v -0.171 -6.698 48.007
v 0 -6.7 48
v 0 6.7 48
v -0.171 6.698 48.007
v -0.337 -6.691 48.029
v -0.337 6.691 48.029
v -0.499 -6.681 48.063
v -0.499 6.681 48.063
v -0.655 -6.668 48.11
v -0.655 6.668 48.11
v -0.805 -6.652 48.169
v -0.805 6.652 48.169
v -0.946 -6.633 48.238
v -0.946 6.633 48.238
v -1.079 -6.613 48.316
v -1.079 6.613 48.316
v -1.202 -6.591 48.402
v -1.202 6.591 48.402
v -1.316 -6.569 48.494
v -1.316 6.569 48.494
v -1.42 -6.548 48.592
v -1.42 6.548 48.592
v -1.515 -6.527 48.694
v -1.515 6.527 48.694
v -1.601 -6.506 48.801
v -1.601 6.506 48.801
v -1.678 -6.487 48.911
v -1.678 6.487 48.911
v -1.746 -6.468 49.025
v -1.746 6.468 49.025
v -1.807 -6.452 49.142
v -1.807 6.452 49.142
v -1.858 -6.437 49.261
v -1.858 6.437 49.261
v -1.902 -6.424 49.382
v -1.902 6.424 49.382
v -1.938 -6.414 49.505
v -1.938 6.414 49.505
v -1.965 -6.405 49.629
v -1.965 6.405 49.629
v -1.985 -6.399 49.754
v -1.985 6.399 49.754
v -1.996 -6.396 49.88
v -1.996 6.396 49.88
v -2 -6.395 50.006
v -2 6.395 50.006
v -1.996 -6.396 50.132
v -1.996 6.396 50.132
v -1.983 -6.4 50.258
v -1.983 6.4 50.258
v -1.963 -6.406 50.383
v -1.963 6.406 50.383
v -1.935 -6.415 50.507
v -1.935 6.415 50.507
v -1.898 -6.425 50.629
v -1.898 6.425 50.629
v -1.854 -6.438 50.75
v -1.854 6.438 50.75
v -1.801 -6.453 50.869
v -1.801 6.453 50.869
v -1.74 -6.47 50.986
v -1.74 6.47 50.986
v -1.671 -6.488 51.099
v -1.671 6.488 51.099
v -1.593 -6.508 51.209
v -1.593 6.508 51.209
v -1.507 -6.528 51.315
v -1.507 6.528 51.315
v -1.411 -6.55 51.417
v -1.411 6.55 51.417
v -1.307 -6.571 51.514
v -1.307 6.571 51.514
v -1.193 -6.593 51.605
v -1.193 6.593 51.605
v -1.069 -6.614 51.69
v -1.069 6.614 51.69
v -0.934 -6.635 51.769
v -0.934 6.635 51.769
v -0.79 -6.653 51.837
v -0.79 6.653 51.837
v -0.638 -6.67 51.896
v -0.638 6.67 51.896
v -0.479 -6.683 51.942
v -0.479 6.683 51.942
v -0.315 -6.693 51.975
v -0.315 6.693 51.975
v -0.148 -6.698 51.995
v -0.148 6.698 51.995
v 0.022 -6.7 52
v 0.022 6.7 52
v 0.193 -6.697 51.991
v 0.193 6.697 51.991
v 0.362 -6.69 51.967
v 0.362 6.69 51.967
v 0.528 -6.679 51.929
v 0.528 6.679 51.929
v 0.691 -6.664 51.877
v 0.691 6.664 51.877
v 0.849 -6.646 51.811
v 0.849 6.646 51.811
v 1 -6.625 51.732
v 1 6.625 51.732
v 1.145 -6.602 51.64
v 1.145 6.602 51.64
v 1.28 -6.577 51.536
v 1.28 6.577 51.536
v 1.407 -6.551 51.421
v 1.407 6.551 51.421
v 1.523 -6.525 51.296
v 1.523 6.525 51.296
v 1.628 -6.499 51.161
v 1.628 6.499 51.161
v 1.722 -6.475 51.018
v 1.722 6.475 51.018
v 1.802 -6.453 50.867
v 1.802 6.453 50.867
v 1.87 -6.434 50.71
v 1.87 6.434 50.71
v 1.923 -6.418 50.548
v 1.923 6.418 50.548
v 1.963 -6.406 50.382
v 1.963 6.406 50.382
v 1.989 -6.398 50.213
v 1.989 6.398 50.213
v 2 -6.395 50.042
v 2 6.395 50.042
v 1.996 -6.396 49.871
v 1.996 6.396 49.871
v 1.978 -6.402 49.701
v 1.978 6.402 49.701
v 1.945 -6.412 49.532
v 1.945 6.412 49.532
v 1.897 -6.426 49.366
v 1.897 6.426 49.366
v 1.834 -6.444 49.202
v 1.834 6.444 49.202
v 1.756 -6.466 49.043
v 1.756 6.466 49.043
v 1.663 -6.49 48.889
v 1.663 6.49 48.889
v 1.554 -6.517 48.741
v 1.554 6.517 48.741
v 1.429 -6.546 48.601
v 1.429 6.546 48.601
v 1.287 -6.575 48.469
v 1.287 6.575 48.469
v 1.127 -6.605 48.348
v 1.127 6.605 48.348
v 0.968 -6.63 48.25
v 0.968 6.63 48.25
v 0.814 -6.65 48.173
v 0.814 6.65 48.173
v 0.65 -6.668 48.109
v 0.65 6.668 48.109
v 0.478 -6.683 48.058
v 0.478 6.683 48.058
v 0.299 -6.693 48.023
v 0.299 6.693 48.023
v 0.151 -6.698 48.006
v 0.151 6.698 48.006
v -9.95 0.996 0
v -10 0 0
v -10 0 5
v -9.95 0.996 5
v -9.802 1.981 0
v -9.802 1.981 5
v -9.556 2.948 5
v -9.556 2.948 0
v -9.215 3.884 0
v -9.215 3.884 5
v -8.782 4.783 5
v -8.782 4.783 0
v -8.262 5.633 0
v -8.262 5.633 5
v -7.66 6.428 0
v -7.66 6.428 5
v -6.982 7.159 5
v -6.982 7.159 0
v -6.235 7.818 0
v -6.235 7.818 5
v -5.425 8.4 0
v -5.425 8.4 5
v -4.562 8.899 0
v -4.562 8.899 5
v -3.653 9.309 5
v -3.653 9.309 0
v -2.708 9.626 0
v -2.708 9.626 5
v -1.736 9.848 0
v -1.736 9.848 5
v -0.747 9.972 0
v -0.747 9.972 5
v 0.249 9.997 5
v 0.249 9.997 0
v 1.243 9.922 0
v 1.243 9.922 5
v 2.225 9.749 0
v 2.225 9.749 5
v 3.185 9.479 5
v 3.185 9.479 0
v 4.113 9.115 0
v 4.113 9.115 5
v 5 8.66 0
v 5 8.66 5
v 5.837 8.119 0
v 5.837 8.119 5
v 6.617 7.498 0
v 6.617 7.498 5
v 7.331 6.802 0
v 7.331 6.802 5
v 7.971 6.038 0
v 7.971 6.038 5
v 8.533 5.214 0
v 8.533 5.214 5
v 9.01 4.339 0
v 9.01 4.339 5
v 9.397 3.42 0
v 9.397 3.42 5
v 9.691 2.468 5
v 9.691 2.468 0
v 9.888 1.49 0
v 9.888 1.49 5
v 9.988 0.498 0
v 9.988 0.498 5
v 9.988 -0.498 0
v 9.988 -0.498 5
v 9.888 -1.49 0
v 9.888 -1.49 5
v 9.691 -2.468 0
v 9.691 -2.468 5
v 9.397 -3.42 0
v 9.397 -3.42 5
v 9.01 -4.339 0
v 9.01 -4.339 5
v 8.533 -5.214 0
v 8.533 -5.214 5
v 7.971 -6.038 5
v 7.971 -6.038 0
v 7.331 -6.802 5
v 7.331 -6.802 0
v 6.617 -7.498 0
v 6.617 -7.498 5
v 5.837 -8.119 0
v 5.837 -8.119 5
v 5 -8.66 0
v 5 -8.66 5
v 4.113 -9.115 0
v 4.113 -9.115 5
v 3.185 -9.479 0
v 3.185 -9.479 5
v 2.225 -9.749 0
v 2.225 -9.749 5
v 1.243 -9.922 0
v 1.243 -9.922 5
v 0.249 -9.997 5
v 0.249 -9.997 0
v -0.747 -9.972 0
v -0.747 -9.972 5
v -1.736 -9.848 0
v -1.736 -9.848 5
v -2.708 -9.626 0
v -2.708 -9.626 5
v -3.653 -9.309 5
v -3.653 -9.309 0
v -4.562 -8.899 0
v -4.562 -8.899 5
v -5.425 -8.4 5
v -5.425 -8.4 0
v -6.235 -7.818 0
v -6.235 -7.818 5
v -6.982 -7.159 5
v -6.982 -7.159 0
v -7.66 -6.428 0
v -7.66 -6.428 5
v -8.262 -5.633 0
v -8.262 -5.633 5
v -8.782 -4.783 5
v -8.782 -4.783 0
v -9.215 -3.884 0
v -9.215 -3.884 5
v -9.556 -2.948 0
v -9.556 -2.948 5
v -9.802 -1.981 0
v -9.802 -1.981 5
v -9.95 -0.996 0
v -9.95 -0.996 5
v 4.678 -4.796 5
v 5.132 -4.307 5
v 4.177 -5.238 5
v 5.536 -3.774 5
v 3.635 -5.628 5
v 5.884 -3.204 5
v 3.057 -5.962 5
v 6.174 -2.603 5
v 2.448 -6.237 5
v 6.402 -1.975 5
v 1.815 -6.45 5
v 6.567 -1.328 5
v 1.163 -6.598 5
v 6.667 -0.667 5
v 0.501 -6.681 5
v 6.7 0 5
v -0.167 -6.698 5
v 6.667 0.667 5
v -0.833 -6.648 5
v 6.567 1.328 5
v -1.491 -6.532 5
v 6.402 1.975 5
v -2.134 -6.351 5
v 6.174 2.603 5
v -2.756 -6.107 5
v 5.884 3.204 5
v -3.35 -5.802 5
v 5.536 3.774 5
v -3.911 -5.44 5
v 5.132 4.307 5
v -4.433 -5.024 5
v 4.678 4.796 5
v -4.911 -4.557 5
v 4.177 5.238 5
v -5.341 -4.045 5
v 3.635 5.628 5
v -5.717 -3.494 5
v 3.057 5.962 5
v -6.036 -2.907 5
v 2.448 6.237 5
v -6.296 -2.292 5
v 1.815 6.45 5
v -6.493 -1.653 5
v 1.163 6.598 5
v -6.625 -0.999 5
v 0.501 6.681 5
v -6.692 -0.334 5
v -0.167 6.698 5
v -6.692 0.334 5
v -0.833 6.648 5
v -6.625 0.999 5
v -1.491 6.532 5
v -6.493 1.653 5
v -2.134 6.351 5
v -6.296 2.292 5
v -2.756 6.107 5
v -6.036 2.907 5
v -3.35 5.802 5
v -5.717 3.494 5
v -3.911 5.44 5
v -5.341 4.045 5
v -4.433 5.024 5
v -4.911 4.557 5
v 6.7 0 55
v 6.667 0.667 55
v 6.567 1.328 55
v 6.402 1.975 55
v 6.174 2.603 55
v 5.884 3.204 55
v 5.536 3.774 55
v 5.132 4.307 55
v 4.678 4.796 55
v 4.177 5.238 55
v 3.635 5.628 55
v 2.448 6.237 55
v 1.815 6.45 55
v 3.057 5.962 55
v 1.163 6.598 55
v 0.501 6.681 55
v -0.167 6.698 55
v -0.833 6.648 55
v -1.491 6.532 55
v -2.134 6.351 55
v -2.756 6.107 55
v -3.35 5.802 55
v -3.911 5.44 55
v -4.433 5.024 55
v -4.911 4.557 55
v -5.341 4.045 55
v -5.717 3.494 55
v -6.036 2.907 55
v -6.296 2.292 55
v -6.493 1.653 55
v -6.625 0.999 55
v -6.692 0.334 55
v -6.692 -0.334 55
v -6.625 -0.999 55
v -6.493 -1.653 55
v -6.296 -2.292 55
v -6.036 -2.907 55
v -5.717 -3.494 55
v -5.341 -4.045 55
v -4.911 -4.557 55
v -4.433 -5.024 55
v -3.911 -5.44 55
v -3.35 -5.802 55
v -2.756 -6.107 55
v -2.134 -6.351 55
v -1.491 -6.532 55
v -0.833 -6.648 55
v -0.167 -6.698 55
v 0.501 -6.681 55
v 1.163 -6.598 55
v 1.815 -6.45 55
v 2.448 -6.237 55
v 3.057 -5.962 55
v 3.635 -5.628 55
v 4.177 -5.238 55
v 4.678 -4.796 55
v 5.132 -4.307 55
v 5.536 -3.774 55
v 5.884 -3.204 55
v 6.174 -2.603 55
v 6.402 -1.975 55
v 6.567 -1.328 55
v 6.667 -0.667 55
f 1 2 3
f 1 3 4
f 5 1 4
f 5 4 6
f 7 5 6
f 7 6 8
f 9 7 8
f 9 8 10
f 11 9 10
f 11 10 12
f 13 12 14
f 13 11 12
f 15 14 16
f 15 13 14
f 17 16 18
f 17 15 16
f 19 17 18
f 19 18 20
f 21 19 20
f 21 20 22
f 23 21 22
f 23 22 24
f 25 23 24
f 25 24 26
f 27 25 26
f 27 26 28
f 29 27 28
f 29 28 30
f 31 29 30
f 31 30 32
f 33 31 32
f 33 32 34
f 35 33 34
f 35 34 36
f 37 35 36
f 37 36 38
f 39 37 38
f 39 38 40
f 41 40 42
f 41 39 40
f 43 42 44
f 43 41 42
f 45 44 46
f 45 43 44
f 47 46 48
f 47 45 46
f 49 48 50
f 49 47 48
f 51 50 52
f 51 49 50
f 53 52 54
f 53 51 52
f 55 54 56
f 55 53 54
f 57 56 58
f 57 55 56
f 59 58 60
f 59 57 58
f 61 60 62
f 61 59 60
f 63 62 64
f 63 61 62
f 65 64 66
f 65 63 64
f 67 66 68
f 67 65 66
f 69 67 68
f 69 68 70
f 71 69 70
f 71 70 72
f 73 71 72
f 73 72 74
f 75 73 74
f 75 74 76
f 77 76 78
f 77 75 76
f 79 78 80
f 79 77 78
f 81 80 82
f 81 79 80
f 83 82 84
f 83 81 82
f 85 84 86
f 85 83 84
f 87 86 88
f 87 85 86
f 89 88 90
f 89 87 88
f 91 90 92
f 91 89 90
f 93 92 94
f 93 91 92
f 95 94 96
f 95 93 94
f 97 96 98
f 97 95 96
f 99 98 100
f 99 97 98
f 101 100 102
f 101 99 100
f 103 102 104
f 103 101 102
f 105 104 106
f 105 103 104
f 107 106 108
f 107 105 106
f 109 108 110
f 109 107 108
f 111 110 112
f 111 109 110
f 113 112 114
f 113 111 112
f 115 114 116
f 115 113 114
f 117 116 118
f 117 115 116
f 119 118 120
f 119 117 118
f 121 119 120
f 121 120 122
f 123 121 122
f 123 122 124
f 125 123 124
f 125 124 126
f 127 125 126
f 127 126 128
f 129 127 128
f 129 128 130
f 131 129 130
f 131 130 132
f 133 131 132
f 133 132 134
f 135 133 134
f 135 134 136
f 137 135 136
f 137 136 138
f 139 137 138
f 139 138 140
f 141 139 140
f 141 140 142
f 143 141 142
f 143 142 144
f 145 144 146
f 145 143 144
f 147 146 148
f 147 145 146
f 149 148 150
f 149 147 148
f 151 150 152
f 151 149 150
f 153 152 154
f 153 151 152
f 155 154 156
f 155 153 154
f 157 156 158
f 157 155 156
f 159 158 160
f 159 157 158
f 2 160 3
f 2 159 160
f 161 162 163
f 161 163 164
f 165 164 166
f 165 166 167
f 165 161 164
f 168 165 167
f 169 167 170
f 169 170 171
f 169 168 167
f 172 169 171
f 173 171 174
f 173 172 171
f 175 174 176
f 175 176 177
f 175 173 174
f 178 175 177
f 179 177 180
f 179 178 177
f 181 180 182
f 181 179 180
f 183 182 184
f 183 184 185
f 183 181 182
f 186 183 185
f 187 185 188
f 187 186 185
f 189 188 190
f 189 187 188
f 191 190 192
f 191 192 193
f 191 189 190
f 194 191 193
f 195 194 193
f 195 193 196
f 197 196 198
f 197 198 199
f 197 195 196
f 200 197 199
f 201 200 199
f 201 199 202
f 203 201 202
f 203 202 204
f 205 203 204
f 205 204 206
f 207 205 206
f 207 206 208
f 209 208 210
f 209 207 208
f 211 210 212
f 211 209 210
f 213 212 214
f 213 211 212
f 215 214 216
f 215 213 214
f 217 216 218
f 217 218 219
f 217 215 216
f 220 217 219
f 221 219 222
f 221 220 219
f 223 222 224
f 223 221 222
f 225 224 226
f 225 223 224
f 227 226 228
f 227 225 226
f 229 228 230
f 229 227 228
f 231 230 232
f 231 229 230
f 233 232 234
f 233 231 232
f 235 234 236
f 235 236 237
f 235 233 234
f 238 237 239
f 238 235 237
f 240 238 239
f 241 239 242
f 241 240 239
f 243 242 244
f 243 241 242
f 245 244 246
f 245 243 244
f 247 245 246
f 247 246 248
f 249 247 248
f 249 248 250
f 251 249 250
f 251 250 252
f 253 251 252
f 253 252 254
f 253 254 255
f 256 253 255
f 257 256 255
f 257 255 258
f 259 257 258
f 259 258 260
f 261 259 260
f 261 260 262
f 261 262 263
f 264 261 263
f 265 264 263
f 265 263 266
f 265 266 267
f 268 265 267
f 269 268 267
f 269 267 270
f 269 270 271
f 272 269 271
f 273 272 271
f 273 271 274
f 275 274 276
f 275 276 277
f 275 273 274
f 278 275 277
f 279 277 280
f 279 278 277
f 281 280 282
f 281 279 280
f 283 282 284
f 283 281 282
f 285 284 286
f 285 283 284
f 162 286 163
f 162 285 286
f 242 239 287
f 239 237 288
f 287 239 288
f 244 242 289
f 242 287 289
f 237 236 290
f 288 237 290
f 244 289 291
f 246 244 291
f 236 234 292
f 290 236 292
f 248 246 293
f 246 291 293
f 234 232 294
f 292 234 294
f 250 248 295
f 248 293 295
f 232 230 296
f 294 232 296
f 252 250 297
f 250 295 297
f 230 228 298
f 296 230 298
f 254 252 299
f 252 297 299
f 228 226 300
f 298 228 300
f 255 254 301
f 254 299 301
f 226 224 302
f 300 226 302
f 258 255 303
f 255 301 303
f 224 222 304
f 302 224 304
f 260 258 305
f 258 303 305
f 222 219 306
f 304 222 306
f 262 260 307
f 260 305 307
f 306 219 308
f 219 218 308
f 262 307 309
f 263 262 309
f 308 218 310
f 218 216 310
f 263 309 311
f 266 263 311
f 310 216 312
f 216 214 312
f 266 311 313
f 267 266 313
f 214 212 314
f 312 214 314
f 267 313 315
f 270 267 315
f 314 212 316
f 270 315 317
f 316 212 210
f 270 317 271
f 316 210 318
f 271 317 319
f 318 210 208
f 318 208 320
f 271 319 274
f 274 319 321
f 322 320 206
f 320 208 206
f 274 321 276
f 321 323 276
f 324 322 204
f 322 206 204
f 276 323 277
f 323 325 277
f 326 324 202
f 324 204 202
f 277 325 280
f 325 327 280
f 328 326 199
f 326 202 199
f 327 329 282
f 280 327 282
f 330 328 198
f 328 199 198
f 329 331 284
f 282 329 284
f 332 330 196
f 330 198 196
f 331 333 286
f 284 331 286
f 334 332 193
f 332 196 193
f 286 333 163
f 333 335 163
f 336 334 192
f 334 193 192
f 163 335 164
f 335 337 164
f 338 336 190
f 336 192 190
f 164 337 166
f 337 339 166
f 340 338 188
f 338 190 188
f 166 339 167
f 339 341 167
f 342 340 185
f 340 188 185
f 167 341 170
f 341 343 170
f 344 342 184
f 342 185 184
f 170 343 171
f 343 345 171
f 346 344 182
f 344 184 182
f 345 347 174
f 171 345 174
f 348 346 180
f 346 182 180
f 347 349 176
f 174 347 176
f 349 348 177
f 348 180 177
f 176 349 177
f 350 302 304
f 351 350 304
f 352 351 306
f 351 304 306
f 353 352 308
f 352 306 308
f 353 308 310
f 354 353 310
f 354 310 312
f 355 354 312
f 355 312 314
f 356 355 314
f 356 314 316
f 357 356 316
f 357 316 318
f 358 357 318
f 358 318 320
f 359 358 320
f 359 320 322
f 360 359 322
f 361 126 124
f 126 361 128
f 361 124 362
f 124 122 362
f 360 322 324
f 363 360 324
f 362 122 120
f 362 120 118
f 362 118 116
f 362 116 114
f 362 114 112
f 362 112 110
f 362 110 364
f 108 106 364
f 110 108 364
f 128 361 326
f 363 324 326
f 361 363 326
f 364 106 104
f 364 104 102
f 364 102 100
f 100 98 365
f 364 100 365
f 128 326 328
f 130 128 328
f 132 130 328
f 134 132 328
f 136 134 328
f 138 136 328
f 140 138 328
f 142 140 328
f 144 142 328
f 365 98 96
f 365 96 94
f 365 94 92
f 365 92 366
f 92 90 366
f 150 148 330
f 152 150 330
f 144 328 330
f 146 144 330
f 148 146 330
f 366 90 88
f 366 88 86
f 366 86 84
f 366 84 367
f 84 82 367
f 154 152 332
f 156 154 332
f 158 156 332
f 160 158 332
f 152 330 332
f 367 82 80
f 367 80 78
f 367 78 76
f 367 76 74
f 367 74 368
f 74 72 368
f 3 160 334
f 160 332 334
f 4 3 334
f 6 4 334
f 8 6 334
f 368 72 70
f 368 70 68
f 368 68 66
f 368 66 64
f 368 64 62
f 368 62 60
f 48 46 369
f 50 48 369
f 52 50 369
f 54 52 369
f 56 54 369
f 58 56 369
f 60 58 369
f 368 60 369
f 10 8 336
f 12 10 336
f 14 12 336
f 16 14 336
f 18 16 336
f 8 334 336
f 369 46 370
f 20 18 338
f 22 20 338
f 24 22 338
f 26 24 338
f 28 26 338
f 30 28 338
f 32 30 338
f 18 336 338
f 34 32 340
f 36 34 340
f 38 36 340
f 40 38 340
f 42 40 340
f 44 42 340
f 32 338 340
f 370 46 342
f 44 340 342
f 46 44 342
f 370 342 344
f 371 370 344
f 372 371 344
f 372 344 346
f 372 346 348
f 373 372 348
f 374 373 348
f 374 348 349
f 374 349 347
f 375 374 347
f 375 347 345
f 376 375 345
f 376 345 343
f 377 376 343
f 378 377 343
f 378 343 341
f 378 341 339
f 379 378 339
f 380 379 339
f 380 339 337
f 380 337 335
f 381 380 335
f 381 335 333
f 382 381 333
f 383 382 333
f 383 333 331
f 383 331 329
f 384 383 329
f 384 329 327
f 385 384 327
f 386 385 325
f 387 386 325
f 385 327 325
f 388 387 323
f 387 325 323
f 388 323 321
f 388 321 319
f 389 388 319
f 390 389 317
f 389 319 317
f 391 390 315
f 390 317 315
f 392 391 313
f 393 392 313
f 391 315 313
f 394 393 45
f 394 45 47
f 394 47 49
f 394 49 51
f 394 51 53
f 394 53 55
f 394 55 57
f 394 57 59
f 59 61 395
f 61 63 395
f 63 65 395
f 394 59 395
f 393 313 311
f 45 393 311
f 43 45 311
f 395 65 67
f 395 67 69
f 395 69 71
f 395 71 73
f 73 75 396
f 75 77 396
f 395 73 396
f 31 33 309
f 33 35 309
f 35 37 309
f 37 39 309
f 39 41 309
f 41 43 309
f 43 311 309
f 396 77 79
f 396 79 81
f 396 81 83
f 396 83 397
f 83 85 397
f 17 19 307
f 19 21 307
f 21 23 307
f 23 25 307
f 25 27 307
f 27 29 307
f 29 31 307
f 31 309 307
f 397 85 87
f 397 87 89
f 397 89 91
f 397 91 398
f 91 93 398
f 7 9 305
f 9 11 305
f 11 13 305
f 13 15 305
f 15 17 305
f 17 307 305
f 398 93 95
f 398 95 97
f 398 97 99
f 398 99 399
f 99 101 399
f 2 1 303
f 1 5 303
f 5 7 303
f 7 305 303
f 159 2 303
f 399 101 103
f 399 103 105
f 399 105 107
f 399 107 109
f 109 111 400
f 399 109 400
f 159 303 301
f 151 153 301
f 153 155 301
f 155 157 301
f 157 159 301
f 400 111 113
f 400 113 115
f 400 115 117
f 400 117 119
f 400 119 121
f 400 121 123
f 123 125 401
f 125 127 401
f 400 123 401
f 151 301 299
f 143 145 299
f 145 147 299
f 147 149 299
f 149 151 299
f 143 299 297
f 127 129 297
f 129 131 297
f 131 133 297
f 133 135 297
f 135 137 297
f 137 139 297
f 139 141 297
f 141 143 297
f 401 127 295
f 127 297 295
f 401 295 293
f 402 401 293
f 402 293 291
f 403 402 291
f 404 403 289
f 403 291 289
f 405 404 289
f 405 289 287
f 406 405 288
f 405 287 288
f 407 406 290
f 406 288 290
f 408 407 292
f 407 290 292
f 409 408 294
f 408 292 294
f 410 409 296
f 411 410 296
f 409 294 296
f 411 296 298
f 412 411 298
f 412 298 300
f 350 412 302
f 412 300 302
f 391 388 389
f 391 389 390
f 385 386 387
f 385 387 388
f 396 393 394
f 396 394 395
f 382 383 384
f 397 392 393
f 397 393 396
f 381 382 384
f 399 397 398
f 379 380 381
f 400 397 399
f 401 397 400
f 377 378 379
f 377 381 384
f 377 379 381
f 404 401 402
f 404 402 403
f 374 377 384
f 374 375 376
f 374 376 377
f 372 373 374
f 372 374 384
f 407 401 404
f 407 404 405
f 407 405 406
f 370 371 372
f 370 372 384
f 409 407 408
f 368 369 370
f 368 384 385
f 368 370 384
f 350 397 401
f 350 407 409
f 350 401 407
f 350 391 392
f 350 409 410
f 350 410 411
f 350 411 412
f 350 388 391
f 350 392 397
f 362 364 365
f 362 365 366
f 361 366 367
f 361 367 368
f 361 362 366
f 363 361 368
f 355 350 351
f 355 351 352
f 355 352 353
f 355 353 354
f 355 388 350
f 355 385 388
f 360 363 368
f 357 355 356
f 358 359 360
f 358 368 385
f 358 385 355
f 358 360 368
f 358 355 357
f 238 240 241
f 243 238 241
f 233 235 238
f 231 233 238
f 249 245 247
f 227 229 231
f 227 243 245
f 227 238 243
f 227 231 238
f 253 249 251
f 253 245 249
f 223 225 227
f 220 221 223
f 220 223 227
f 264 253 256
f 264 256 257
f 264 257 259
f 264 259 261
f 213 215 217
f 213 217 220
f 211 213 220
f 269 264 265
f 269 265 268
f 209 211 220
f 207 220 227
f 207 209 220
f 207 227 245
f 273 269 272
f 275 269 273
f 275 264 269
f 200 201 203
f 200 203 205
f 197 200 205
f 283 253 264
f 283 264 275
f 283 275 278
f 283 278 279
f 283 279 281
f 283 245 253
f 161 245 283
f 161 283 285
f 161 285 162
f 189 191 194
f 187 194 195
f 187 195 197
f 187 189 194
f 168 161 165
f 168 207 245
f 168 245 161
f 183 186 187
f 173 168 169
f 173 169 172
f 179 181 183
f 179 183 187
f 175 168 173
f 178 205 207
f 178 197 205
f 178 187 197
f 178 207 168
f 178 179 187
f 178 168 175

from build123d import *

# Parameters (mm, degrees)
SKETCH2_R               = 6.7
BOSS_EXTRUDE1_DEPTH     = 55
SKETCH3_R               = 10
BOSS_EXTRUDE2_DEPTH     = 5
CUT_EXTRUDE1_DEPTH      = 10
CUT_EXTRUDE1_DEPTH_BACK = 15
SKETCH5_R               = 2


with BuildPart() as part:
    # Sketch2 → Boss-Extrude1 (new body)
    with BuildSketch(Plane.XY):
        Circle(SKETCH2_R)
    extrude(amount=BOSS_EXTRUDE1_DEPTH)

    # Sketch3 → Boss-Extrude2 (add)
    with BuildSketch(Plane(origin=(0, 0, 0), x_dir=(-1, 0, 0), z_dir=(0, 0, -1))):
        Circle(SKETCH3_R)
    extrude(amount=-BOSS_EXTRUDE2_DEPTH)

    # Sketch5 → Cut-Extrude1 (cut, two sides: drawn at the far end of the back side and taken through both)
    with BuildSketch(Plane(origin=(0, 0, 0), x_dir=(1, 0, 0), z_dir=(0, 1, 0)).offset(-CUT_EXTRUDE1_DEPTH_BACK)):
        with Locations(Location((0, -50, 0), (0, 0, 90))):
            Circle(SKETCH5_R)
    extrude(amount=CUT_EXTRUDE1_DEPTH + CUT_EXTRUDE1_DEPTH_BACK, mode=Mode.SUBTRACT)


solid = part.part
